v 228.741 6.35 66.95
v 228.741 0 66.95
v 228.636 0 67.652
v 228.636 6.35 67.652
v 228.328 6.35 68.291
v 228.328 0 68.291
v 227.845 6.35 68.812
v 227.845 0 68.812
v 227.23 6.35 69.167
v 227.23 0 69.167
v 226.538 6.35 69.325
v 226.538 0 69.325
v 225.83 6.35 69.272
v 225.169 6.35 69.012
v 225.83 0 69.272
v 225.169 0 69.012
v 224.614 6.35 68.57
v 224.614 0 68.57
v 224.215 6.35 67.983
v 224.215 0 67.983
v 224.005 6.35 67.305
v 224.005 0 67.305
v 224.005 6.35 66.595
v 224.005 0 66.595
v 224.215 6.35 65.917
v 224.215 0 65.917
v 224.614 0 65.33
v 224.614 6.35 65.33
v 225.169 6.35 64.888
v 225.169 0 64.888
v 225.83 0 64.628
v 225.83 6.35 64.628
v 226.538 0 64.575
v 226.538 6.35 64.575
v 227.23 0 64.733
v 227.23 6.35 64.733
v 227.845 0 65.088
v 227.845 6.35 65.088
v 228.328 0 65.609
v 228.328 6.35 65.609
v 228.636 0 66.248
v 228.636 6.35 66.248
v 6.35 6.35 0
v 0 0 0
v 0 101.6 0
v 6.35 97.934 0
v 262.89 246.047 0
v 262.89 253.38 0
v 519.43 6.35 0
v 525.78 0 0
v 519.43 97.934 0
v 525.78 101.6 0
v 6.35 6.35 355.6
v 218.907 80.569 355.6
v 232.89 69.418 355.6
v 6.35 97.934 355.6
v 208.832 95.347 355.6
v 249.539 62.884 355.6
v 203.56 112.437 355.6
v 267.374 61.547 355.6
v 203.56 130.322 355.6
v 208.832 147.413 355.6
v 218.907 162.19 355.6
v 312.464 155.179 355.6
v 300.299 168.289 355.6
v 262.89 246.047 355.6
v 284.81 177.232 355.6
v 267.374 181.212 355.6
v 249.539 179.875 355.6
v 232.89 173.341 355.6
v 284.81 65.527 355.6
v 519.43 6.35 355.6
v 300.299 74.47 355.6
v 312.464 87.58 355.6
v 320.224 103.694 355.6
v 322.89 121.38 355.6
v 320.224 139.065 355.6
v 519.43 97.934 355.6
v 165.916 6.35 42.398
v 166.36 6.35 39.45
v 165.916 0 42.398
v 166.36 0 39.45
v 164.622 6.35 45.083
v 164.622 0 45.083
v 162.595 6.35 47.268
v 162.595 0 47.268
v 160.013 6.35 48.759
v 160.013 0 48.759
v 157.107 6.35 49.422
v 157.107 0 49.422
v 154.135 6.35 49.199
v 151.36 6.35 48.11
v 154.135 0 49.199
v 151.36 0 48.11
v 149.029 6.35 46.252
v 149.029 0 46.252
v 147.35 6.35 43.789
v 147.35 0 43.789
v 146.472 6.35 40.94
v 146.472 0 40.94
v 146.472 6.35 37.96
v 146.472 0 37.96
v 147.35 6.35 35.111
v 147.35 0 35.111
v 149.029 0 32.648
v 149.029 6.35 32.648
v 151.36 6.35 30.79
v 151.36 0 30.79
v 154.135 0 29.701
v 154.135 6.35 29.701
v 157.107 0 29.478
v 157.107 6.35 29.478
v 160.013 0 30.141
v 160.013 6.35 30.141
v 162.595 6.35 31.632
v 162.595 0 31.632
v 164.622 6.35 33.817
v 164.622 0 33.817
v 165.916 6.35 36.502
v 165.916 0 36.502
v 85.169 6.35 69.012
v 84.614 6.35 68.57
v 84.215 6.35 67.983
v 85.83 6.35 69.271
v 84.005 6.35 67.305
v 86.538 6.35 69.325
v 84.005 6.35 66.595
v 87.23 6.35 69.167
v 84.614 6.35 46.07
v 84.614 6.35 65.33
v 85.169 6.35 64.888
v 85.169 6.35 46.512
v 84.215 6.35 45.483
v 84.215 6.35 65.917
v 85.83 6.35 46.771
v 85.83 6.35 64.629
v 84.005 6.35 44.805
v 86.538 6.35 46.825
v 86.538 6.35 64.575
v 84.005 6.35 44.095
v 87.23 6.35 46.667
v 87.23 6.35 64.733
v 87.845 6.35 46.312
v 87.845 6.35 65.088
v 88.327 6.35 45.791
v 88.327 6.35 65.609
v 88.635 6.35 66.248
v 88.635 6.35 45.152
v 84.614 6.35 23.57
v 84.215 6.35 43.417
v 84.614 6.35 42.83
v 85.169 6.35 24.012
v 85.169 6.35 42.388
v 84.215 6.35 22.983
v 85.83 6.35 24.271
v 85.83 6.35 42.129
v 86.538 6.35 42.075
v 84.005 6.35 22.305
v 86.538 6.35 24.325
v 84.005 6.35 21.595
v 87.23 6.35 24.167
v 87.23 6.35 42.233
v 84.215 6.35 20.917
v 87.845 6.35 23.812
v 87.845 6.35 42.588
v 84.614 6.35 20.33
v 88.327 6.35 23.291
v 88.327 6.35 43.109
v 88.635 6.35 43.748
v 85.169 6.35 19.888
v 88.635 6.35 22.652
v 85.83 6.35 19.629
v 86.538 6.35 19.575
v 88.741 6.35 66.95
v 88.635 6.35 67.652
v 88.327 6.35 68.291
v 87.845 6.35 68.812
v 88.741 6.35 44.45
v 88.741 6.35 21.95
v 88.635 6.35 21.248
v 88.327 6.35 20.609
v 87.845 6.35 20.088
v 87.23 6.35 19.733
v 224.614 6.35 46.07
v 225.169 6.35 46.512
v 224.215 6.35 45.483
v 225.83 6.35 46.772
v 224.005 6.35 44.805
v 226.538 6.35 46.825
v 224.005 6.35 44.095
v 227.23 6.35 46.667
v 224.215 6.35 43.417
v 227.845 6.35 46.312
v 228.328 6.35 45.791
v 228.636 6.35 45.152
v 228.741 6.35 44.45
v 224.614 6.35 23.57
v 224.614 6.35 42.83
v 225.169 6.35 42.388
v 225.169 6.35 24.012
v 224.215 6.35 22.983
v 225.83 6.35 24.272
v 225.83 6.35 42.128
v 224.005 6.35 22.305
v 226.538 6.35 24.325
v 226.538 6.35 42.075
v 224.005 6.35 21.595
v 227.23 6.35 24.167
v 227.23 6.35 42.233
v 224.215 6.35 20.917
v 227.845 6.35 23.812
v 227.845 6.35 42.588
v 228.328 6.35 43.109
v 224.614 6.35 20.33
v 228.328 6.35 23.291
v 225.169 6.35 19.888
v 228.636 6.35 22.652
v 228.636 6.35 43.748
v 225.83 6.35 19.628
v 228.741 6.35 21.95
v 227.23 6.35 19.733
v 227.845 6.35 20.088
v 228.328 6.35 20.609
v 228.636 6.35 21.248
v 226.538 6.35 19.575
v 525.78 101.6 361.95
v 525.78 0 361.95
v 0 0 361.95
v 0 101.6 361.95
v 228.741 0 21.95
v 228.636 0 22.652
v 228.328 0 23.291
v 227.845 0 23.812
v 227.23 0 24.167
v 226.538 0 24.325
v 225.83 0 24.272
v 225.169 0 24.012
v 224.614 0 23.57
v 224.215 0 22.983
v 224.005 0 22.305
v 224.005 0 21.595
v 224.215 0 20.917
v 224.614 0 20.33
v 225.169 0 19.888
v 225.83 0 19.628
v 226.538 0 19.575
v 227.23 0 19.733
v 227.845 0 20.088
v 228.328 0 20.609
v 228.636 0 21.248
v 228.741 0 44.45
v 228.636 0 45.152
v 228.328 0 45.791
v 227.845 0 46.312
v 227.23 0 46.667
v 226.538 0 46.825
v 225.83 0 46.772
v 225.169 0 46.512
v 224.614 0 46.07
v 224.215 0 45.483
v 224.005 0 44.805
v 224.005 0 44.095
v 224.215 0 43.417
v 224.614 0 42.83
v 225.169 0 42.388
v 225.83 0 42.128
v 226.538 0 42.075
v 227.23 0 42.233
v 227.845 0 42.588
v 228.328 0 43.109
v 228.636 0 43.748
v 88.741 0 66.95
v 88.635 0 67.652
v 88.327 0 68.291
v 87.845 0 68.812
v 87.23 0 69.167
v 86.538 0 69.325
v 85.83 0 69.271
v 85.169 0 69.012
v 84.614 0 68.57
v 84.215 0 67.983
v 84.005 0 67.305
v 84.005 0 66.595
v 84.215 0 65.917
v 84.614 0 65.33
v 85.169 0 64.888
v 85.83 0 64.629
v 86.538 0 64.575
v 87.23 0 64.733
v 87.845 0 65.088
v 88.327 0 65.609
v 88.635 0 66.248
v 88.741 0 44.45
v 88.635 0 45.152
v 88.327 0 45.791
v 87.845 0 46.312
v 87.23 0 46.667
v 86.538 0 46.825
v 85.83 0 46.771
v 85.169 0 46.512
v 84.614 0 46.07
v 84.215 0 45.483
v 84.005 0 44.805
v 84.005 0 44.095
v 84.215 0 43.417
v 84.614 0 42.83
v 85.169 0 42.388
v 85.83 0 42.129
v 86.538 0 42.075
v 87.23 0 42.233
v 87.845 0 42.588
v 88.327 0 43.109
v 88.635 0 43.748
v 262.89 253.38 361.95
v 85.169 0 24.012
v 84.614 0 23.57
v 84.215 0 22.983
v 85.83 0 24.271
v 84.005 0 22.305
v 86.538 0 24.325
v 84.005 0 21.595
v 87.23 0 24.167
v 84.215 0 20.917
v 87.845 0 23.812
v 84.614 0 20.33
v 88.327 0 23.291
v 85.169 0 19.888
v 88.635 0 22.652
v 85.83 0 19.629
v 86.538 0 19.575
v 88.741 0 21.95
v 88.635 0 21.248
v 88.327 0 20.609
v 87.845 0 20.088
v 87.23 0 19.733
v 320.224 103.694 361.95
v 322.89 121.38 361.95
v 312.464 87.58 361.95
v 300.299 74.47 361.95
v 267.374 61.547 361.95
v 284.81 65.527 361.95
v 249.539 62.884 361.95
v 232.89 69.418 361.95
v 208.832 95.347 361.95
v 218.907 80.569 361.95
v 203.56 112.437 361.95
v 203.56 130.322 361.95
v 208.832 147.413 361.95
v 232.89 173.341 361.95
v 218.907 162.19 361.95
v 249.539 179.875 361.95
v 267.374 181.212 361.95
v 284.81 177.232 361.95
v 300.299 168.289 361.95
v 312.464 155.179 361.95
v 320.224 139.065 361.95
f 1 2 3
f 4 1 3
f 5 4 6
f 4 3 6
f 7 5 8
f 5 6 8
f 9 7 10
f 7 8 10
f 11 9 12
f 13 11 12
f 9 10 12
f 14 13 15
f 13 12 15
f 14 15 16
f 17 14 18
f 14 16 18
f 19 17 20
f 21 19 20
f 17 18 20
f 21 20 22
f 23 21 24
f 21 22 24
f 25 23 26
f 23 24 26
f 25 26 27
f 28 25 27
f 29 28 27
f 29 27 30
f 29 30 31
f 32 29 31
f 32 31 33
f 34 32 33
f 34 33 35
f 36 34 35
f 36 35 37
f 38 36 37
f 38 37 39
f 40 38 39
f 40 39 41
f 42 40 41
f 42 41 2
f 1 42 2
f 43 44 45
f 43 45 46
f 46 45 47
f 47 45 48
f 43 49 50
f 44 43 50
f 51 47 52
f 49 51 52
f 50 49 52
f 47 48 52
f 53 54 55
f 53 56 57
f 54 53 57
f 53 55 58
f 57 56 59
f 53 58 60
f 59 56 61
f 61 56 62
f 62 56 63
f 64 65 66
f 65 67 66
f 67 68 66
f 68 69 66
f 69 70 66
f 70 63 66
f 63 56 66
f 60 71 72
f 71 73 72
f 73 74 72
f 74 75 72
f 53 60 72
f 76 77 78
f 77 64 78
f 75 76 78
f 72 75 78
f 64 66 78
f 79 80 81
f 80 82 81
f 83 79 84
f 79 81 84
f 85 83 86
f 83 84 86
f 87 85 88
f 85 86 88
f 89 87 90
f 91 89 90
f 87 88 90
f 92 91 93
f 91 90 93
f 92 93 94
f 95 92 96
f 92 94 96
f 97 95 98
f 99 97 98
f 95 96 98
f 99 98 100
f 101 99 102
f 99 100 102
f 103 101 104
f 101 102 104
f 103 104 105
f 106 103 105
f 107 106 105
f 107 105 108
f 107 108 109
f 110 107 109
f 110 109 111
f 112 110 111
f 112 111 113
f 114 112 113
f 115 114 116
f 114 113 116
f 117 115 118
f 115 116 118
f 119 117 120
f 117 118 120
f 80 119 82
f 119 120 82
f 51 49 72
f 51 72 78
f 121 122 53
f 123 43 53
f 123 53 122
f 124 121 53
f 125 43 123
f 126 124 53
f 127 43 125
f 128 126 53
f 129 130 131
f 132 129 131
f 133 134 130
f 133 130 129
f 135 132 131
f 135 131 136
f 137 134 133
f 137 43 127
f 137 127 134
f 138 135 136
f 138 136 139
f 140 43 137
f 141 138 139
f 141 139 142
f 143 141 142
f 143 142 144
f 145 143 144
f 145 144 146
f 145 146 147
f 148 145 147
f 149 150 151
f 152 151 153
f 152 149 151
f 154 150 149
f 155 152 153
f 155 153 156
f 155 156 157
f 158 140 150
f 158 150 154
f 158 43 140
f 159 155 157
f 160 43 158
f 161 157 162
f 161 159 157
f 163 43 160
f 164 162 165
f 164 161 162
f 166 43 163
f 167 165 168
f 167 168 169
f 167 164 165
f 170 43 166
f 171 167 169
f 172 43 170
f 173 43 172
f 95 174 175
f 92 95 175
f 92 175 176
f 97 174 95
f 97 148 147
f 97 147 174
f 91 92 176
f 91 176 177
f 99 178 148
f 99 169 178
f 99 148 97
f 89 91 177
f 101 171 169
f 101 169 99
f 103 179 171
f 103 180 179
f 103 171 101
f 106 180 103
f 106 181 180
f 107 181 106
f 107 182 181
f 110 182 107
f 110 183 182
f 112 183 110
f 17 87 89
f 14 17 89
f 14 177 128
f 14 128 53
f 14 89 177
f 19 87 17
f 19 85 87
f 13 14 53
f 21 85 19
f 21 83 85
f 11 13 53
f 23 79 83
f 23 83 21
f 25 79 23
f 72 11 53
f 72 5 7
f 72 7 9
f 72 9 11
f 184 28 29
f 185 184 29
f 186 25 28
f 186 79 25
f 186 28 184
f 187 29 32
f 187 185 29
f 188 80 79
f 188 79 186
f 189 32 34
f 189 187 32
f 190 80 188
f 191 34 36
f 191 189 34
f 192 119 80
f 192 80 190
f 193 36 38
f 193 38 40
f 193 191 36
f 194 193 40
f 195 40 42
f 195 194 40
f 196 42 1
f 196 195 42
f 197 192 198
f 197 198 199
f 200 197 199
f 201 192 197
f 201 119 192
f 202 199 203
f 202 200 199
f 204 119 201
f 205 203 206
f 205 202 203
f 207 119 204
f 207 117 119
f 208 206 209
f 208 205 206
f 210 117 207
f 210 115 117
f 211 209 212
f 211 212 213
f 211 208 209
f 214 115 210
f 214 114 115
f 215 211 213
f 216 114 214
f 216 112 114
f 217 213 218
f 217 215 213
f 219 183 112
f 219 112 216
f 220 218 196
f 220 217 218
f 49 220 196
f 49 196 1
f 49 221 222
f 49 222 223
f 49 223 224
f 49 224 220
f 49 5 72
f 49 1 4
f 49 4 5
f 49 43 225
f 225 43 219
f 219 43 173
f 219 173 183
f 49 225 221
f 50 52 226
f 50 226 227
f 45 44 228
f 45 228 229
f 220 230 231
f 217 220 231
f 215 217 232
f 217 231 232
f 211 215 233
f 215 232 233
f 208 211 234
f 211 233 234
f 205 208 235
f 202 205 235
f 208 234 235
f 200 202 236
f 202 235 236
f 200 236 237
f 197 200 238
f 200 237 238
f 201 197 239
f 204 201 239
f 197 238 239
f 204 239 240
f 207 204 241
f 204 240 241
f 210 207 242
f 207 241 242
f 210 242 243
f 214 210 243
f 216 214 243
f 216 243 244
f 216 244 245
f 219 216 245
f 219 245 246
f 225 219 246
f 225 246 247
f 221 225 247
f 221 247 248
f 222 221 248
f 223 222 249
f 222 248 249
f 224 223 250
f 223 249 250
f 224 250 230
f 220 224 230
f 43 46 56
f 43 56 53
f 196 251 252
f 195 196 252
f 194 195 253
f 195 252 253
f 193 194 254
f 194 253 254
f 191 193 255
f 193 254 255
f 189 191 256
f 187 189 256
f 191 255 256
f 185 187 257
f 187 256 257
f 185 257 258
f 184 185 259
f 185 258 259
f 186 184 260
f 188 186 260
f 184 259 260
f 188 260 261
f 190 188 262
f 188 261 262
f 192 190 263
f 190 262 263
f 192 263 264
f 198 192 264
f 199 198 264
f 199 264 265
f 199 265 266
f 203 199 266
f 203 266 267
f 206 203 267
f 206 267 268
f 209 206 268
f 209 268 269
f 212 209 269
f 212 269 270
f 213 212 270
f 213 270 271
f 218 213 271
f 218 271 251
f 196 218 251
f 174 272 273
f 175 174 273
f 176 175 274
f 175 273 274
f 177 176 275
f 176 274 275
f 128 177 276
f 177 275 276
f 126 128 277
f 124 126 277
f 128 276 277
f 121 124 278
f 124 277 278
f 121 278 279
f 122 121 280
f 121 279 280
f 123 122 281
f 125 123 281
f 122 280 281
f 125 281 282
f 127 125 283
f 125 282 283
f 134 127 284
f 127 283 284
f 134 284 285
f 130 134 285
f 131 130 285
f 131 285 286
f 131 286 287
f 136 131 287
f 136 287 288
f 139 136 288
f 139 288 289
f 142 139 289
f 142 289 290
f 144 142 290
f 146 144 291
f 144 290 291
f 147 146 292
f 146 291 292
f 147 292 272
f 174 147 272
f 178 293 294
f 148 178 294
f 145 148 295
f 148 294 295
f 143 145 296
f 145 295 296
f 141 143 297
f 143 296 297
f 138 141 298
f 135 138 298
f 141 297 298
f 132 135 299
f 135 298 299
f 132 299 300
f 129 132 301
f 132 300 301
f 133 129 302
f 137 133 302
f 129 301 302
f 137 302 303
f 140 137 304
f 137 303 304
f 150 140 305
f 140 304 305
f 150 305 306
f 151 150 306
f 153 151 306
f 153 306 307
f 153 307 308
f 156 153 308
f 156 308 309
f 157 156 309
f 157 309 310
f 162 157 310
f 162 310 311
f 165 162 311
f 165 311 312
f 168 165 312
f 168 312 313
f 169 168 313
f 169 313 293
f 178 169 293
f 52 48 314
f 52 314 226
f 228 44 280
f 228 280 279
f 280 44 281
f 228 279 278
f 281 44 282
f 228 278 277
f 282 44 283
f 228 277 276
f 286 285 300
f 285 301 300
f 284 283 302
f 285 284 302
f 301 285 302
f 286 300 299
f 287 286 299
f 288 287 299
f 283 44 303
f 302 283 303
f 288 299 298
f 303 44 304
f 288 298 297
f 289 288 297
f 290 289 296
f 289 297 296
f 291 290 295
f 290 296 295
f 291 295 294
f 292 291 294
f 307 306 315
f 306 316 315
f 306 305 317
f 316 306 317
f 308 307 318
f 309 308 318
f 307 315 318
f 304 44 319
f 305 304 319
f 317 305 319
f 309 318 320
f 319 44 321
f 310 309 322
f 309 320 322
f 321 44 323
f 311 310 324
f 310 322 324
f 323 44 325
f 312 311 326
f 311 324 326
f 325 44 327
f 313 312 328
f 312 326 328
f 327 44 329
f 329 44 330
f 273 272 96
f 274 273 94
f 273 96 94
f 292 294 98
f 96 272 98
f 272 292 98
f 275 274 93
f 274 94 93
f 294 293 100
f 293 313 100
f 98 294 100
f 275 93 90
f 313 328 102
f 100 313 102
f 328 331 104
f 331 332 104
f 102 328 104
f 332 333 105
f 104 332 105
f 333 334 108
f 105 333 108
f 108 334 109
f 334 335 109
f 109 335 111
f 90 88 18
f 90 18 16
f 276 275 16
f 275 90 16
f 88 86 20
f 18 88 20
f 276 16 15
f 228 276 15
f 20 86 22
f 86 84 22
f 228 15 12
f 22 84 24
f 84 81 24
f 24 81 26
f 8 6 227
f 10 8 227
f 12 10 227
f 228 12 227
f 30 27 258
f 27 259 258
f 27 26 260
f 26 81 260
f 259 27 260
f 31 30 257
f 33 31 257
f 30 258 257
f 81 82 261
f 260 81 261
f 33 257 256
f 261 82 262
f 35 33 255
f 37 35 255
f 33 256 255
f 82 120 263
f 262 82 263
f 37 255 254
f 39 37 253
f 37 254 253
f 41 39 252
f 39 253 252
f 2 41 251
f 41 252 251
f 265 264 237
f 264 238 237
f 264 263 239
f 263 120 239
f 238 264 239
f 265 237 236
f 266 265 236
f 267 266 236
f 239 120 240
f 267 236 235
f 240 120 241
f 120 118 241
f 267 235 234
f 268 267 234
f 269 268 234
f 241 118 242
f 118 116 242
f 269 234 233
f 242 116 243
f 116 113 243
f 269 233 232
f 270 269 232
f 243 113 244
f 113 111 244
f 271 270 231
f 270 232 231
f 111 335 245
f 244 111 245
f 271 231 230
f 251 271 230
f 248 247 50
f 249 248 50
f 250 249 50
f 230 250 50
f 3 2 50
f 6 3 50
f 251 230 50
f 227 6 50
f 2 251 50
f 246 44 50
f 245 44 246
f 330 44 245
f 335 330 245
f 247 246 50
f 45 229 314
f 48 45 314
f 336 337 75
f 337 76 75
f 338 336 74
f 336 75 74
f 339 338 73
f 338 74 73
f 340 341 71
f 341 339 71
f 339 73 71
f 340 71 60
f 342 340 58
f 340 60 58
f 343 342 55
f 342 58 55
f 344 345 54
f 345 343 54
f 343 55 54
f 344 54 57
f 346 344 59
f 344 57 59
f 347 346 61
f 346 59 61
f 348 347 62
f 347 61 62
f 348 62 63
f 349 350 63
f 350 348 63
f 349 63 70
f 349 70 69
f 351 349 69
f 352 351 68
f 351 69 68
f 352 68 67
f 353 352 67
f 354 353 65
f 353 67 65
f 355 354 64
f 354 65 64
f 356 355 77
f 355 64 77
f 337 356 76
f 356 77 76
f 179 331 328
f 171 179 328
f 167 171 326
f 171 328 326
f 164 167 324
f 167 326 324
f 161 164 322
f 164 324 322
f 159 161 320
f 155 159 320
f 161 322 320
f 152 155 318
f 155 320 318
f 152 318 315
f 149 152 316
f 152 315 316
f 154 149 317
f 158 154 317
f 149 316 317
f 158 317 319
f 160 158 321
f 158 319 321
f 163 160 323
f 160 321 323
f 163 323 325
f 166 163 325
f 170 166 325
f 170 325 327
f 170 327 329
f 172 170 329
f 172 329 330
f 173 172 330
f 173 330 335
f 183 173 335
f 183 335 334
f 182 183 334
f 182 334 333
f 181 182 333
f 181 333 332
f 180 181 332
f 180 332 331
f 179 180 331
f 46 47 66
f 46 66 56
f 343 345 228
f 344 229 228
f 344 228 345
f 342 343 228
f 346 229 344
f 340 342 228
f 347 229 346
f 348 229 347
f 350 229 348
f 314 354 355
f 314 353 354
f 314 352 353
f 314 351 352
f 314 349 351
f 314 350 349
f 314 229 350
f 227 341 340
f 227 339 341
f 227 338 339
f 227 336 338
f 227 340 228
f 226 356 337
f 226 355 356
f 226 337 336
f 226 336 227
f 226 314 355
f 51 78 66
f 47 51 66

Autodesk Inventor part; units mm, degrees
ref_plane "YZ Plane" through (0, 0, 0) normal (1, 0, 0) x (0, 1, 0)
ref_plane "XZ Plane" through (0, 0, 0) normal (0, 1, 0) x (-1, 0, 0)
ref_plane "XY Plane" through (0, 0, 0) normal (0, 0, 1) x (1, 0, 0)
sketch "Sketch1" plane through (0, 0, 0) normal (0, 0, 1) x (1, 0, 0)
  line L0 (0, 0) -> (525.78, 0)
  line L1 (0, 0) -> (0, 101.6)
  line L2 (0, 101.6) -> (262.89, 253.3796)
  line L3 (262.89, 253.3796) -> (525.78, 101.6)
  line L4 (525.78, 101.6) -> (525.78, 0)
  line L5 (262.89, 246.0473) -> (6.35, 97.9338)
  line L6 (6.35, 97.9338) -> (6.35, 6.35)
  line L7 (6.35, 6.35) -> (519.43, 6.35)
  line L8 (519.43, 6.35) -> (519.43, 97.9338)
  line L9 (519.43, 97.9338) -> (262.89, 246.0473)
  point P0 (262.89, 0)
  dimension "d0" = 525.78
  dimension "d1" = 101.6
  dimension "d2" = 120
  dimension "d3" = 6.35
extrude "Extrusion1" add sketch "Sketch1" along normal blind 355.6
sketch "Sketch2" plane through (0, 0, 355.6) normal (0, 0, 1) x (1, 0, 0)
  line L0 (262.89, 246.0473) -> (519.43, 97.9338) projected
  line L1 (519.43, 97.9338) -> (519.43, 6.35) projected
  line L2 (519.43, 6.35) -> (6.35, 6.35) projected
  line L3 (6.35, 6.35) -> (6.35, 97.9338) projected
  line L4 (6.35, 97.9338) -> (262.89, 246.0473) projected
  line L5 (0, 0) -> (525.78, 0) projected
  line L6 (525.78, 0) -> (525.78, 101.6) projected
  line L7 (525.78, 101.6) -> (262.89, 253.3796) projected
  line L8 (262.89, 253.3796) -> (0, 101.6) projected
  line L9 (0, 101.6) -> (0, 0) projected
  circle A0 centre (262.89, 121.3796) radius 60
  dimension "d6" = 120
  dimension "d7" = 132
extrude "Extrusion2" add sketch "Sketch2" along normal blind 6.35 contours L0 L1 L2 L3 L4 | L9 L8 L7 L6 L5
sketch "Sketch3" plane through (0, 0, 0) normal (0, -1, 0) x (1, 0, 0)
  line L0 (0, 0) -> (525.78, 0) construction
  line L1 (525.78, 0) -> (525.78, 88.9)
  line L2 (525.78, 88.9) -> (0, 88.9) construction
  line L3 (0, 88.9) -> (0, 0) construction
  line L4 (86.36, 21.95) -> (86.36, 66.95) construction
  circle A0 centre (86.36, 44.45) radius 2.3812
  circle A1 centre (86.36, 21.95) radius 2.3812
  circle A2 centre (86.36, 66.95) radius 2.3812
  line L5 (146.36, 49.45) -> (146.36, 29.45) construction
  line L6 (156.36, 66.95) -> (156.36, 21.95) construction
  line L7 (146.36, 29.45) -> (166.36, 29.45) construction
  line L8 (166.36, 49.45) -> (146.36, 49.45) construction
  line L9 (86.36, 66.95) -> (226.36, 66.95) construction
  line L10 (226.36, 21.95) -> (86.36, 21.95) construction
  line L11 (86.36, 44.45) -> (226.36, 44.45) construction
  line L12 (166.36, 29.45) -> (166.36, 49.45) construction
  line L13 (226.36, 66.95) -> (226.36, 21.95) construction
  circle A3 centre (226.36, 66.95) radius 2.3813
  circle A4 centre (226.36, 44.45) radius 2.3813
  circle A5 centre (226.36, 21.95) radius 2.3813
  circle A6 centre (156.36, 39.45) radius 10
  line L14 (0, 0) -> (0, 361.95) projected
  line L15 (525.78, 0) -> (525.78, 361.95) projected
  line L16 (0, 0) -> (525.78, 0) projected
  point P0 (0, 44.45)
  point P1 (146.36, 39.45)
  point P2 (166.36, 39.45)
  point P3 (262.89, 0)
  dimension "d10" = 45
  dimension "d11" = 140
  dimension "d12" = 4.7625
  dimension "d13" = 4.7625
  dimension "d14" = 4.7625
  dimension "d15" = 4.7625
  dimension "d16" = 4.7625
  dimension "d17" = 4.7625
  dimension "d18" = 60
  dimension "d19" = 7.5
  dimension "d20" = 20
  dimension "d21" = 20
  dimension "d22" = 86.36
  dimension "d23" = 88.9
extrude "Extrusion3" cut sketch "Sketch3" against normal blind 6.35
sketch "Sketch4" plane through (0, 0, 0) normal (0, -1, 0) x (1, 0, 0)
  line L0 (71.36, 0) -> (241.36, 0)
  line L1 (241.36, 0) -> (241.36, 85)
  line L2 (241.36, 85) -> (71.36, 85)
  line L3 (71.36, 85) -> (71.36, 0)
  line L4 (0, 0) -> (525.78, 0) construction
  circle A0 centre (156.36, 39.45) radius 10 construction
  point P0 (156.36, 85)
  dimension "d26" = 170
  dimension "d27" = 85
extrude "Extrusion4" [suppressed]
properties part number "CA01" material "ABS Plastic"
